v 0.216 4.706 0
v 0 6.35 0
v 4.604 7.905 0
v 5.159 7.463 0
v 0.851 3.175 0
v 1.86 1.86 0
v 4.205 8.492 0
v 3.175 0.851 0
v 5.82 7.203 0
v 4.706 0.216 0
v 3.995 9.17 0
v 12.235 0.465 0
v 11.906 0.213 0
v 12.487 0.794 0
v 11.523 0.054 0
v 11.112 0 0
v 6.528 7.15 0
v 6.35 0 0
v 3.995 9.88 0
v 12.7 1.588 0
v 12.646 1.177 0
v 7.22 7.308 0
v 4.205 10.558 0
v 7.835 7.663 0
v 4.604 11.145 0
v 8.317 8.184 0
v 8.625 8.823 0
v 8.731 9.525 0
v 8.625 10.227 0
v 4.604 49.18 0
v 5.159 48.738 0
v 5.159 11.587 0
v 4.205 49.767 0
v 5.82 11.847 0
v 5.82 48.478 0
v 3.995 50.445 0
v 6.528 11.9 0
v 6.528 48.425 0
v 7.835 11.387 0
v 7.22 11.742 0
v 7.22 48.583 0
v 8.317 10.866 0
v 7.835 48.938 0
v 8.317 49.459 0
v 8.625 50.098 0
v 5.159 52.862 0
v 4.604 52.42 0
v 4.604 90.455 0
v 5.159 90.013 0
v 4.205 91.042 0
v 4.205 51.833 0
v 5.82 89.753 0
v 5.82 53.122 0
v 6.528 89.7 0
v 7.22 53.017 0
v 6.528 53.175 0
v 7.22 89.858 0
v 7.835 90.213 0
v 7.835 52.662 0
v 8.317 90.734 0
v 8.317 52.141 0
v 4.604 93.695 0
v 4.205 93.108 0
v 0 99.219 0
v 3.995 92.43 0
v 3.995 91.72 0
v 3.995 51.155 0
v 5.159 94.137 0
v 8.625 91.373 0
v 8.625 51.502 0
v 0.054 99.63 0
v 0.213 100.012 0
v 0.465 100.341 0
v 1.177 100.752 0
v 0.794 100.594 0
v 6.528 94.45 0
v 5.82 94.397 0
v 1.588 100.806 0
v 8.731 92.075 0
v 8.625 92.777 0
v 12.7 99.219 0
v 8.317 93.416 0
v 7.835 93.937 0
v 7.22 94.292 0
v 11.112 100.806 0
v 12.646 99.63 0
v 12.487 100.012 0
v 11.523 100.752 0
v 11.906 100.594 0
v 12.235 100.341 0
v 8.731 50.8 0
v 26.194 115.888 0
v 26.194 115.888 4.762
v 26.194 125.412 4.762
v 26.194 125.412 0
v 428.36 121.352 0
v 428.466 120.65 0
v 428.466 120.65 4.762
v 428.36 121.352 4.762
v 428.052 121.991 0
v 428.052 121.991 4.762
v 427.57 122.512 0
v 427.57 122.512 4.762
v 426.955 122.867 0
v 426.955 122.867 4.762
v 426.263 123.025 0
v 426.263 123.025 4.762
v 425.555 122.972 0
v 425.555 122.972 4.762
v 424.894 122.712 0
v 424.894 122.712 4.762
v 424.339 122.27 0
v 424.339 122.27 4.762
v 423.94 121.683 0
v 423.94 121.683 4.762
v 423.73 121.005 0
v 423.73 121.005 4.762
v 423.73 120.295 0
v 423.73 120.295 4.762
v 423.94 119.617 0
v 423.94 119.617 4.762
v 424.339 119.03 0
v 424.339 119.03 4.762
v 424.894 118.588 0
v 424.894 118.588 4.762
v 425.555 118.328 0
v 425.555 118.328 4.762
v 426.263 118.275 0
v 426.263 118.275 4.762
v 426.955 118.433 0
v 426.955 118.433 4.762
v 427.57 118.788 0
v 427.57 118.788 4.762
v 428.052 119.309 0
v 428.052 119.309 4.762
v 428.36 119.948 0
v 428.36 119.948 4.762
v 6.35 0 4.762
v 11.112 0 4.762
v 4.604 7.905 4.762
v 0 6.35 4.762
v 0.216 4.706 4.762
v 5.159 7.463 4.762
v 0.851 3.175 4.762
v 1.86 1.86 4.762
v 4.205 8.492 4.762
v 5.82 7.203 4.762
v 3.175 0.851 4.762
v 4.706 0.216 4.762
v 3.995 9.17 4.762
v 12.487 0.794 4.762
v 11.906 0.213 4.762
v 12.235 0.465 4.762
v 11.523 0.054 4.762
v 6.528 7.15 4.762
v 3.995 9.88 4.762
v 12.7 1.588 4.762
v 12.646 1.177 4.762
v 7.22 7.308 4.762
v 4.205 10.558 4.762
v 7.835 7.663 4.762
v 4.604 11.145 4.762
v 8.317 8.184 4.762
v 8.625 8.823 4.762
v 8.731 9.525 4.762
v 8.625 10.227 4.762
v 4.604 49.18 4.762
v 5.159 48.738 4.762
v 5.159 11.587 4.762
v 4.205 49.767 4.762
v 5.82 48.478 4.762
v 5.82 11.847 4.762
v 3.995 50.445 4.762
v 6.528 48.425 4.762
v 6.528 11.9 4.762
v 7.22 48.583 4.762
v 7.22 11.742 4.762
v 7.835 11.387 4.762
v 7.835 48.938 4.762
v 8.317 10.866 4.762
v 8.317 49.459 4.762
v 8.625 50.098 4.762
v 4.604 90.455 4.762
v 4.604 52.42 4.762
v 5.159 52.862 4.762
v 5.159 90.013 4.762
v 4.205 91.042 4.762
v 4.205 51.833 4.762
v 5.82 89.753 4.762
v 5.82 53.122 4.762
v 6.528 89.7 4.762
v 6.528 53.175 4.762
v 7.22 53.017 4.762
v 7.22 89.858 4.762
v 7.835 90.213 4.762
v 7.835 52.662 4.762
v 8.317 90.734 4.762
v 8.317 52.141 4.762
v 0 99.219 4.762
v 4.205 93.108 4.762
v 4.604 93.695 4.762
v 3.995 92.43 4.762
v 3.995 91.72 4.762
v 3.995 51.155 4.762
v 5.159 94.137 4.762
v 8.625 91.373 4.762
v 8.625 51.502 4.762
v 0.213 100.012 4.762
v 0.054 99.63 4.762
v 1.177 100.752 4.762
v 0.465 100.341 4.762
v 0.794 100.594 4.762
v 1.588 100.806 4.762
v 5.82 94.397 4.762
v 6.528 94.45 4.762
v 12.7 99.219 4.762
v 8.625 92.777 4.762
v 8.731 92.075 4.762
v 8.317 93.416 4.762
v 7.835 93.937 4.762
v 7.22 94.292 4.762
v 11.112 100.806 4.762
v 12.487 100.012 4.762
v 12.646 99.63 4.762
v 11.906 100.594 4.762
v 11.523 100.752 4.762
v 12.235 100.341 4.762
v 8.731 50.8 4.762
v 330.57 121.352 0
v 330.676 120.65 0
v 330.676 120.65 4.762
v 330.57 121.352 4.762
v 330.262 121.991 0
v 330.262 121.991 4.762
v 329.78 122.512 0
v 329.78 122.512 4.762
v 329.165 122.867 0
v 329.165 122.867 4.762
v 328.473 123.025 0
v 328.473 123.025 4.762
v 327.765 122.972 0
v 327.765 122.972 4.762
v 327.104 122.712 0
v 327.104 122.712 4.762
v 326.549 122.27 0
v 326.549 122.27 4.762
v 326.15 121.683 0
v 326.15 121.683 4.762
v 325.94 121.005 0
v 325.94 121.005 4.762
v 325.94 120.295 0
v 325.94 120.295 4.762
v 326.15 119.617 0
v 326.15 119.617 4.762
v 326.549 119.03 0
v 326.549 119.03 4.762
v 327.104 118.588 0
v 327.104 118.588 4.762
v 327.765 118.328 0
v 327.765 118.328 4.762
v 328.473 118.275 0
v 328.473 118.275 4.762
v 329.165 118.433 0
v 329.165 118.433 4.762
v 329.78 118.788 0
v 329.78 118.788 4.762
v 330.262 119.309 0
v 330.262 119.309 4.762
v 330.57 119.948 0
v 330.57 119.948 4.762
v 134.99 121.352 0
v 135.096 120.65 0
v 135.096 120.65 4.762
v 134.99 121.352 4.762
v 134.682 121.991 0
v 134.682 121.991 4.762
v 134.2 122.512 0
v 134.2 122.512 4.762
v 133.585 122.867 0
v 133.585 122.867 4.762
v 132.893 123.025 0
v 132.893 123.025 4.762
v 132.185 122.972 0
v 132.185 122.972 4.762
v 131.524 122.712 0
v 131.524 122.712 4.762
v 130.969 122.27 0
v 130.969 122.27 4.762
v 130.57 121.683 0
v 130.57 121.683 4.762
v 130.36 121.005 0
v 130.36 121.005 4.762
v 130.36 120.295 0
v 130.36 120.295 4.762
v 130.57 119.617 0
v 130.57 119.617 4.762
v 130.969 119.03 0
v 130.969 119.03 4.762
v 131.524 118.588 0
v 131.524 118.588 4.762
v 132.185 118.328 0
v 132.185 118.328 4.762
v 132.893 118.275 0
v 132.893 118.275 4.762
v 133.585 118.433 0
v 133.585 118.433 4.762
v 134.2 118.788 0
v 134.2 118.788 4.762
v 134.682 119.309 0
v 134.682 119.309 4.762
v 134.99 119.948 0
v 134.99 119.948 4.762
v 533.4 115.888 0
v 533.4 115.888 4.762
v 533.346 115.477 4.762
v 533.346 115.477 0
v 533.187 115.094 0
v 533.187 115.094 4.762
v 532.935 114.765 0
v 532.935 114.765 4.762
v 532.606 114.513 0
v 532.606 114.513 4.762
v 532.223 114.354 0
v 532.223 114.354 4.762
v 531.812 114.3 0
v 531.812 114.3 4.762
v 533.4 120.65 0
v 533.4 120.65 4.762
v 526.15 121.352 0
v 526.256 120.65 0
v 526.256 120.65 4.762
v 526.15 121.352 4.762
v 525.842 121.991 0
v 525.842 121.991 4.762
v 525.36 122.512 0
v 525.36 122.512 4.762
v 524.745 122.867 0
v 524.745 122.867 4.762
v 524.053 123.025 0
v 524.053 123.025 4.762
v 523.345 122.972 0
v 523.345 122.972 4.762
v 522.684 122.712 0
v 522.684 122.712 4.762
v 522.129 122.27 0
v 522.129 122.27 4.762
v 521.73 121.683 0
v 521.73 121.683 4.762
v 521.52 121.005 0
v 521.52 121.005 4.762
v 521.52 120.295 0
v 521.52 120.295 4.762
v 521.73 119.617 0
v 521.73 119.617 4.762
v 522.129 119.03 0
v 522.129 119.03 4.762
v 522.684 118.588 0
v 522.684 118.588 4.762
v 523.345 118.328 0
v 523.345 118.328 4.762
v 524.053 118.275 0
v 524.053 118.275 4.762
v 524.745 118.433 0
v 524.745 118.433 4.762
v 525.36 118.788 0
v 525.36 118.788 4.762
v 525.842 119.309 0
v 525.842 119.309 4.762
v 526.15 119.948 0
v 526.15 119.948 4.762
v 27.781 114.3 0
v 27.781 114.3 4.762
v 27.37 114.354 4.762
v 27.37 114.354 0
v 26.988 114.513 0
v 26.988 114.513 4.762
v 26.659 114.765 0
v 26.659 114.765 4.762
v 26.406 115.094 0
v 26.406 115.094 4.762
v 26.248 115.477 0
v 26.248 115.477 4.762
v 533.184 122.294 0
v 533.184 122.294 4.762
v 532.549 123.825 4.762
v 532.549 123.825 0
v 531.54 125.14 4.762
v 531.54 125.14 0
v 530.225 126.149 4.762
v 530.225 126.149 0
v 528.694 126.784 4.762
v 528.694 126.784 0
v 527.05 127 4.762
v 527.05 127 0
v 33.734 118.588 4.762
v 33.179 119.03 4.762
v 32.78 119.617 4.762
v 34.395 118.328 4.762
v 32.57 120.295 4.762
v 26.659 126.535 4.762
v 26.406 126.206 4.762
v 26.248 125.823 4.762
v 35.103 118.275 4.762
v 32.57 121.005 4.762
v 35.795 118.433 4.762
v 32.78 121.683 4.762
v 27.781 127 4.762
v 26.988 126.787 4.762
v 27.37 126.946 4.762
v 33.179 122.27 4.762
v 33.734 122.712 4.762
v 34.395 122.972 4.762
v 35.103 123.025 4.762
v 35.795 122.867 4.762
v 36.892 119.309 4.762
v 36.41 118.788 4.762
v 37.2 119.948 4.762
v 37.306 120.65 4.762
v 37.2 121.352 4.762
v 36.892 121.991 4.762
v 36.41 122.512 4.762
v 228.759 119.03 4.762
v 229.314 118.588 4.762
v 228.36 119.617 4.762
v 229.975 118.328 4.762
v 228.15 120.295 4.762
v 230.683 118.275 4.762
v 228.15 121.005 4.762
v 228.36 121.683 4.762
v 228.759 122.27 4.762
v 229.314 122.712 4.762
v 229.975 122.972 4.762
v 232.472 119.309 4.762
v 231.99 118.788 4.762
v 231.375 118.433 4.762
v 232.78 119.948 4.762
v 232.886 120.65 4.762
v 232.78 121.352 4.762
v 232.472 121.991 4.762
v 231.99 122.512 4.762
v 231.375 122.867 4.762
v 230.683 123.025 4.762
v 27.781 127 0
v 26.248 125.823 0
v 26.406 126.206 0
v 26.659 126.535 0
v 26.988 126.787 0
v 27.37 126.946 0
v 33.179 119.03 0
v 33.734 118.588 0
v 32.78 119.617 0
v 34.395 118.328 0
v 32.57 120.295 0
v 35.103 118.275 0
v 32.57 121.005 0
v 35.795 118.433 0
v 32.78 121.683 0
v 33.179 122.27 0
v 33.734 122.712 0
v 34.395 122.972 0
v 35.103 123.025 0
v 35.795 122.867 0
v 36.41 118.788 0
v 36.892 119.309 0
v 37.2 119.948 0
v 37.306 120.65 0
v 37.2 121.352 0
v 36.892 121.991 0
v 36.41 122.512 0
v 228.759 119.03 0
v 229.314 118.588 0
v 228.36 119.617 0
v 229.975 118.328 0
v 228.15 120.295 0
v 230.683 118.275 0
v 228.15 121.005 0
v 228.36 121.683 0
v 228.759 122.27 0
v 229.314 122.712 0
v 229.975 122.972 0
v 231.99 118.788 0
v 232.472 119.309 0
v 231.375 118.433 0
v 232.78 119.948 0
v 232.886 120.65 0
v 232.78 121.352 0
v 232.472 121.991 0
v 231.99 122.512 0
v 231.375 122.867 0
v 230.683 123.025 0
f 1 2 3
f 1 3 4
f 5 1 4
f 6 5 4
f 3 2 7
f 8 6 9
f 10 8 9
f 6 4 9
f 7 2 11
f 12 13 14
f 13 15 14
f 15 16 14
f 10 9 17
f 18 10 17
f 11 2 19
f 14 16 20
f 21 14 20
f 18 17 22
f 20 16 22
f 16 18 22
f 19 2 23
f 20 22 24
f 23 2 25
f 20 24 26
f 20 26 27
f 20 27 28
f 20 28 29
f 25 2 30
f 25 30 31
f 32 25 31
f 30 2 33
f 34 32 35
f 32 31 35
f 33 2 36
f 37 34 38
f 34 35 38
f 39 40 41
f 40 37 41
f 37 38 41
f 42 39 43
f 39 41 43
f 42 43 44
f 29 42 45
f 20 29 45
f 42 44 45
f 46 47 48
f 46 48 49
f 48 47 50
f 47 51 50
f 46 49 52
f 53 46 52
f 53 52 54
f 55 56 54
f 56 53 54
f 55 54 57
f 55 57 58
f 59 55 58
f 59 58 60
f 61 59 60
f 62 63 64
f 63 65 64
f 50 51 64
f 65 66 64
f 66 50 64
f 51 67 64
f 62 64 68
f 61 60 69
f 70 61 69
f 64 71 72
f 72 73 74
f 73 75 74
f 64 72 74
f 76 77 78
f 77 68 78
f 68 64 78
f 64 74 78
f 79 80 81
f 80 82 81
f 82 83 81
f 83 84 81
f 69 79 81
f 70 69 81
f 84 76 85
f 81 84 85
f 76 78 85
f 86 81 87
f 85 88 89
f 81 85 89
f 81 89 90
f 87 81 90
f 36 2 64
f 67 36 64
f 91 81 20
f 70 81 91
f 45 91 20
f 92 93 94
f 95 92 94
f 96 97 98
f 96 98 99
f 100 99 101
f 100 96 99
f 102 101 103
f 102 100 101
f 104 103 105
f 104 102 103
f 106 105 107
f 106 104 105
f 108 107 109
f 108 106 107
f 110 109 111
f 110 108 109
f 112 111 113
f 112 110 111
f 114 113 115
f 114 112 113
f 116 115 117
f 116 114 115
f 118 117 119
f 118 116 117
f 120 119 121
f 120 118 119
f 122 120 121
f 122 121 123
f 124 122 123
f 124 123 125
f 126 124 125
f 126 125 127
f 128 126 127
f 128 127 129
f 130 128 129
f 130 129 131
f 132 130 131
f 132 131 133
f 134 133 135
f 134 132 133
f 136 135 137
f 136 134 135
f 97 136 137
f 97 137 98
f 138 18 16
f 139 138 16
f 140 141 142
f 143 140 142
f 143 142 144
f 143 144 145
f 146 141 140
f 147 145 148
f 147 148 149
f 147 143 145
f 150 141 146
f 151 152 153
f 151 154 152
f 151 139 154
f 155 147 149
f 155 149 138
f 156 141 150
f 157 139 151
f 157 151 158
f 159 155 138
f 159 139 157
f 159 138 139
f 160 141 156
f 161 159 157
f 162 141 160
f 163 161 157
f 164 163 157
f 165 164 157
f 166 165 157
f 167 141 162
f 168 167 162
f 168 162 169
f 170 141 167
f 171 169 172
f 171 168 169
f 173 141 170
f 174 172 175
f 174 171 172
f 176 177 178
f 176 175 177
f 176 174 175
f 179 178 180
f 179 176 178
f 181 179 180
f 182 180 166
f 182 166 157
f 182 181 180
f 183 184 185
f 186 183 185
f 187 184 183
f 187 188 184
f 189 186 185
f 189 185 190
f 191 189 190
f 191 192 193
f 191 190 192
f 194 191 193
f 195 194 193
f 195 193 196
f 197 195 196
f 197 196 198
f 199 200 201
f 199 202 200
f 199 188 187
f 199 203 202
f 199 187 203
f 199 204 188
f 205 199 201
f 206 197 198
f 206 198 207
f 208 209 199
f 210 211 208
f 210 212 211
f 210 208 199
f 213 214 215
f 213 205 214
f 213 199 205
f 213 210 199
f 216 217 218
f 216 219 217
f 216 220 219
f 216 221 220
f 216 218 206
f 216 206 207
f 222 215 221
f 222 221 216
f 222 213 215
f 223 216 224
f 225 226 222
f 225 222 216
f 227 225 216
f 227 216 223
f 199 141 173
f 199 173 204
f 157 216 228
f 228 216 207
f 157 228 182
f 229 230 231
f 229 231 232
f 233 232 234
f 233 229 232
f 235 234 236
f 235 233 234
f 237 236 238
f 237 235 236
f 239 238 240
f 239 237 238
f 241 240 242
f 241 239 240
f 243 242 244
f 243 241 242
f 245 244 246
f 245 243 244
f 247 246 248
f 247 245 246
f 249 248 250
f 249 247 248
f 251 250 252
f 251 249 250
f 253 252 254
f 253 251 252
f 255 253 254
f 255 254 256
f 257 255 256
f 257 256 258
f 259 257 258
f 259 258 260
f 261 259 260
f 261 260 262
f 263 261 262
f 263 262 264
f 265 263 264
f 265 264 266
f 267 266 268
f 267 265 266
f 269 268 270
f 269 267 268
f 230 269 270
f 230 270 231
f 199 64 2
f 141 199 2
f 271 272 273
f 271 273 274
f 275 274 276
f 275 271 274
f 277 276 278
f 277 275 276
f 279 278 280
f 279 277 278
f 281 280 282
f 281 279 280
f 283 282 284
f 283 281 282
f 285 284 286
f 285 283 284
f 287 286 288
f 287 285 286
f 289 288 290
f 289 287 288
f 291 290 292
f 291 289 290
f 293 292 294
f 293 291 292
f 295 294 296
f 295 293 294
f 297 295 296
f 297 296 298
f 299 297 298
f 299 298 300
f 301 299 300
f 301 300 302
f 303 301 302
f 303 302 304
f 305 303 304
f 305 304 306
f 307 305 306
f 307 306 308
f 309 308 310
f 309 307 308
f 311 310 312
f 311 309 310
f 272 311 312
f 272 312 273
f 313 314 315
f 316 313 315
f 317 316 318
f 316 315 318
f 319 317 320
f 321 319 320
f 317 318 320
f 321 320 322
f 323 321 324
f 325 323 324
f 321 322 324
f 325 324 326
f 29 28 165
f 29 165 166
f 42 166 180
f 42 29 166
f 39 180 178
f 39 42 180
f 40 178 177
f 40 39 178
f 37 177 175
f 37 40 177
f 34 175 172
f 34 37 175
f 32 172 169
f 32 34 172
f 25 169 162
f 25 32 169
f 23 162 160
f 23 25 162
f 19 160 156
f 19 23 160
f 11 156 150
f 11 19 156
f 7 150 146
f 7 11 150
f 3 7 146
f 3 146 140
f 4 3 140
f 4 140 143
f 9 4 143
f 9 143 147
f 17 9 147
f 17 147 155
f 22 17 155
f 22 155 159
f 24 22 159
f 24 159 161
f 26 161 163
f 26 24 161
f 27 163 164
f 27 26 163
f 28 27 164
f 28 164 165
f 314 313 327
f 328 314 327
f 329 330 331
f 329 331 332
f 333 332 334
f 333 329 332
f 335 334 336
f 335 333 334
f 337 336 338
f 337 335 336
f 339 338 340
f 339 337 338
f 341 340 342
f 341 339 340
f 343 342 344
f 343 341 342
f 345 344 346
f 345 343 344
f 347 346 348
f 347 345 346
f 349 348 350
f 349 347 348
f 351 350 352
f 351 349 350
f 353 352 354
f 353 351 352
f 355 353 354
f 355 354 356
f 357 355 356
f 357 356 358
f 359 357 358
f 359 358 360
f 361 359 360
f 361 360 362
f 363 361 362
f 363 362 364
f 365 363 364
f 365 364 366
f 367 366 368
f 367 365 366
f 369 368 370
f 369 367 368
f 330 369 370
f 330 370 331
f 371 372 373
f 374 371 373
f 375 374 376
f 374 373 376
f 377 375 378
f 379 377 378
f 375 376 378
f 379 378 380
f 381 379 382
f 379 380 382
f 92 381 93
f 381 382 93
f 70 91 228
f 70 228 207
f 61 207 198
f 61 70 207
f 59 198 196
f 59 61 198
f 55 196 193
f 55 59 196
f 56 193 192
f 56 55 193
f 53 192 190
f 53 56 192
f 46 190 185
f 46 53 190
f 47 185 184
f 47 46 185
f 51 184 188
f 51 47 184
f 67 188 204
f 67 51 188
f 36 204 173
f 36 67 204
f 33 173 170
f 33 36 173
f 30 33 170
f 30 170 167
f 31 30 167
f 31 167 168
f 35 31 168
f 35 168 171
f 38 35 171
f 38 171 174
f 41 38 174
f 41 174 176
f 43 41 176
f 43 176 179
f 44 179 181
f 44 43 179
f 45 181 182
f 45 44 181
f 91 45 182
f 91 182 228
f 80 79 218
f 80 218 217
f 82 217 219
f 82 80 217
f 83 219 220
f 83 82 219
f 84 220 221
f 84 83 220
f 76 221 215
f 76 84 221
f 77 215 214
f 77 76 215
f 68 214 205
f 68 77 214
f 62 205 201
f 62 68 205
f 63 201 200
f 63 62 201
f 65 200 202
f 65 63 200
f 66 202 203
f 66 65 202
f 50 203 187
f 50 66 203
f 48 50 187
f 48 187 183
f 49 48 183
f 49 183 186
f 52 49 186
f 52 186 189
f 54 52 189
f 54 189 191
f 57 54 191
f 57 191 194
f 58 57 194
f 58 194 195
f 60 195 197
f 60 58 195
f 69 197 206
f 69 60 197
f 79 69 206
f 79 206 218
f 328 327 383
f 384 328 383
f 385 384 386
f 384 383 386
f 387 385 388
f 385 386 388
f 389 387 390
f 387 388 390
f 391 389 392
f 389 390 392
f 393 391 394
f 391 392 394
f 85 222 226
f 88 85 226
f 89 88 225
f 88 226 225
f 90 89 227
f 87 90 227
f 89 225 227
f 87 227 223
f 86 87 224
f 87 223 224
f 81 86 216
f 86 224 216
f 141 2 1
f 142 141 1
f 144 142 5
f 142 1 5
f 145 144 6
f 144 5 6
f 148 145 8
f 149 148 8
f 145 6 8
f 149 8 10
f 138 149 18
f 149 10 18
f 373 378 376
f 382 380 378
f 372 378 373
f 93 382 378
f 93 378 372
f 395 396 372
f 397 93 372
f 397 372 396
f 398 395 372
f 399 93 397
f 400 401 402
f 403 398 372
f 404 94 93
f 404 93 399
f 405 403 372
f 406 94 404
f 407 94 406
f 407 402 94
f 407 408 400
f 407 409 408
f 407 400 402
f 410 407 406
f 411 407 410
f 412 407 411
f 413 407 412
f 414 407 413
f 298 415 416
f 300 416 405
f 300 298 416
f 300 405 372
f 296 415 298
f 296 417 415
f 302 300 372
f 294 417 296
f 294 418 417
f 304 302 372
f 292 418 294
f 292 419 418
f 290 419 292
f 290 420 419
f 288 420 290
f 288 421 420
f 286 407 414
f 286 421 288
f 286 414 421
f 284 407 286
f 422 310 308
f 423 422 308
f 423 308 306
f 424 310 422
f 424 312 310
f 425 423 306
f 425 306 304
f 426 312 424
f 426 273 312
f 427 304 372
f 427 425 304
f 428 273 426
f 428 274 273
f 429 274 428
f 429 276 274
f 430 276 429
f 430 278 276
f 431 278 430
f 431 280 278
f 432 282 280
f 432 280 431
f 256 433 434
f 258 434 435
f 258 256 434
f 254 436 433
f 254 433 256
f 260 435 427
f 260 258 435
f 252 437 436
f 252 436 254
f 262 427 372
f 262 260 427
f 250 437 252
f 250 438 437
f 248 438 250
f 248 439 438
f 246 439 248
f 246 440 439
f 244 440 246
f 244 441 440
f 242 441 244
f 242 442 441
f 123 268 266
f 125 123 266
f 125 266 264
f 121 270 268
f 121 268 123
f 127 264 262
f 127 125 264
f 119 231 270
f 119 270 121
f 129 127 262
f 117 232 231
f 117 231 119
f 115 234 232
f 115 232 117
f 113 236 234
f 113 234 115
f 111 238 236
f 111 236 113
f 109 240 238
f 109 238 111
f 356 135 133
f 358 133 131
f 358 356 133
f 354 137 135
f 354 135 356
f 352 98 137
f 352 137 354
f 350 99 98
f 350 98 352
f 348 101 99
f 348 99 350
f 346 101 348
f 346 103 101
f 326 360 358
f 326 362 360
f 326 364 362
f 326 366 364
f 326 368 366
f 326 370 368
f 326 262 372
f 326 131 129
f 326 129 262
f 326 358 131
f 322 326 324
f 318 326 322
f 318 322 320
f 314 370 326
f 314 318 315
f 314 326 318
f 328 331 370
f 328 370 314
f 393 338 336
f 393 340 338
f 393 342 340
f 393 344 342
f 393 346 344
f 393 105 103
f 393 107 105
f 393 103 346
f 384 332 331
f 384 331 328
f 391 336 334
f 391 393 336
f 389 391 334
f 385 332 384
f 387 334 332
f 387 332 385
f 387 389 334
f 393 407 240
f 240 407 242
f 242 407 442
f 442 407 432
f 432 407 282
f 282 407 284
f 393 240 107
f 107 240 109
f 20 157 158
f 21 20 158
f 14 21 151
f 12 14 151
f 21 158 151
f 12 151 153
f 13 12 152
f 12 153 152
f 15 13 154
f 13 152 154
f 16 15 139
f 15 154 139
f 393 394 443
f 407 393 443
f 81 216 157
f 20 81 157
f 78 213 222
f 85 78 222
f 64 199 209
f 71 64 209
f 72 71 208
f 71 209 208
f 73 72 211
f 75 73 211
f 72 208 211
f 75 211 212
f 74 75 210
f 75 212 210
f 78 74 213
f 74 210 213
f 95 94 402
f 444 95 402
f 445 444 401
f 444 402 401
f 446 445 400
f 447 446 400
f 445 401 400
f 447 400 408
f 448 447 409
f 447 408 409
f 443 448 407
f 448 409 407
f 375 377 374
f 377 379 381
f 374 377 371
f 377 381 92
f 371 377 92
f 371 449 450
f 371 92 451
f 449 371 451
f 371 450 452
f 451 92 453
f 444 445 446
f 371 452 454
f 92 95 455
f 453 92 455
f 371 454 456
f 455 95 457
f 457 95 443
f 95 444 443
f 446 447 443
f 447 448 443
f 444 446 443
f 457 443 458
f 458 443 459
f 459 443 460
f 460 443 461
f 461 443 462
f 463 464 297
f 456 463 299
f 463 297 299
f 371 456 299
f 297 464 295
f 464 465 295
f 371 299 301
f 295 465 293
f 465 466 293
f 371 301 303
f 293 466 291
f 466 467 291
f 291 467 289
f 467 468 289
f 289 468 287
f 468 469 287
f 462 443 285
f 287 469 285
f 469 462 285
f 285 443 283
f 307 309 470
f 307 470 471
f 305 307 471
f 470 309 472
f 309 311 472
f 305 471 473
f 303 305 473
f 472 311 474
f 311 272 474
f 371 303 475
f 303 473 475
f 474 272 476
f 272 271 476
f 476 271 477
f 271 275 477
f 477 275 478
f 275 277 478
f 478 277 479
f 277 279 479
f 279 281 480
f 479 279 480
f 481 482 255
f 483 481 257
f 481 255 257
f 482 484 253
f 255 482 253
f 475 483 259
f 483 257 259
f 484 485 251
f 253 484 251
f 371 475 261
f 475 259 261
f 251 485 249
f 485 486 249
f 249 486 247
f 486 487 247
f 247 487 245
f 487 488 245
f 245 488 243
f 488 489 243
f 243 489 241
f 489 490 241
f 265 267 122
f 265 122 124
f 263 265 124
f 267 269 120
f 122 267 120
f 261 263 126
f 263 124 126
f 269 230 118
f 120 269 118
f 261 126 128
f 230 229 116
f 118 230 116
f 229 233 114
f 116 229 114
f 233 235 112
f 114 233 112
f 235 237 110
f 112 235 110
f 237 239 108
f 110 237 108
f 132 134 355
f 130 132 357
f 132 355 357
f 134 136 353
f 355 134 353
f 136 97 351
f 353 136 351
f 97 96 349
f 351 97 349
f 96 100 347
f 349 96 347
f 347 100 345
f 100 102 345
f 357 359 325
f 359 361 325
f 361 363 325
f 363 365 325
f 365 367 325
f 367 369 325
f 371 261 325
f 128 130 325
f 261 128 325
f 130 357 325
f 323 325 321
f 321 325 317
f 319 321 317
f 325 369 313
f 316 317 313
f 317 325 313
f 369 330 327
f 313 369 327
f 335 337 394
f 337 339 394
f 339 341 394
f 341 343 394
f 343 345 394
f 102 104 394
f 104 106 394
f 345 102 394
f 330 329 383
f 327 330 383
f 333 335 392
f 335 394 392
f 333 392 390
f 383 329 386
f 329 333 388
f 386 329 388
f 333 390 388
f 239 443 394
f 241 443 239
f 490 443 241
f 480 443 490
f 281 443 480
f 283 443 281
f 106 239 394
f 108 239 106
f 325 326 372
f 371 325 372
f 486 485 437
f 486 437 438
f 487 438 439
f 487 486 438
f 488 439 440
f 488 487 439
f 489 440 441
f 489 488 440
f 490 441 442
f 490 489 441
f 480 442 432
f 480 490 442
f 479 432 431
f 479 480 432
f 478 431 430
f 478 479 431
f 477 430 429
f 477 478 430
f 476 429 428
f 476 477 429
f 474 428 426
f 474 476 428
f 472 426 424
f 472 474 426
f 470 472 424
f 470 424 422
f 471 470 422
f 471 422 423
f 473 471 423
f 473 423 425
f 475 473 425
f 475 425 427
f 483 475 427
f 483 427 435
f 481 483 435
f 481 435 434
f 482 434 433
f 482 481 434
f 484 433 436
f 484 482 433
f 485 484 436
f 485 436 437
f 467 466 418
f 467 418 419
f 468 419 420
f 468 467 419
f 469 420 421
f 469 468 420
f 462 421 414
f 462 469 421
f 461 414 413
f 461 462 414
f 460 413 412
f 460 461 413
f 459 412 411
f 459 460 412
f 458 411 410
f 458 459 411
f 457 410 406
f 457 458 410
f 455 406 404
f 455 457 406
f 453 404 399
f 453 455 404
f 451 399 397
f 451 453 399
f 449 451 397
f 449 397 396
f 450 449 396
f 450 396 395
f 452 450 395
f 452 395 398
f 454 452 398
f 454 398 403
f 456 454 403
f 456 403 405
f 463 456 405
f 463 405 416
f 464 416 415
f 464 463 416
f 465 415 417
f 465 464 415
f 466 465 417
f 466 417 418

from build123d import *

# Parameters (mm, degrees)
F0_R     = 2.38125
F1_DEPTH = 4.7625
F4_W     = 13.49375
F4_H     = 13.49375
F4_W_2   = 139.7
F4_H_2   = 38.1
F5_DEPTH = 4.7635
F7_DEPTH = 4.7625


# Not quite as in the source:
# - a feature of the source that left no trace in its solid (it failed there, or was rolled back) is left out


with BuildPart() as f1:
    # F0 (on Top) → F1 (new body)
    with BuildSketch(Plane.XY):
        with BuildLine():
            ThreePointArc((0, 6.35), (1.8598719395, 1.8598719395), (6.35, 0))
            Line((6.35, 0), (527.05, 0))
            ThreePointArc((527.05, 0), (531.5401280605, 1.8598719395), (533.4, 6.35))
            Line((533.4, 6.35), (533.4, 120.65))
            ThreePointArc((533.4, 120.65), (531.5401280605, 125.1401280605), (527.05, 127))
            Line((527.05, 127), (400.05, 127))
            ThreePointArc((400.05, 127), (395.5598719395, 128.8598719395), (393.7, 133.35))
            Line((393.7, 133.35), (393.7, 152.4))
            ThreePointArc((393.7, 152.4), (391.8401280605, 156.8901280605), (387.35, 158.75))
            Line((387.35, 158.75), (273.05, 158.75))
            ThreePointArc((273.05, 158.75), (268.5598719395, 156.8901280605), (266.7, 152.4))
            Line((266.7, 152.4), (266.7, 133.35))
            ThreePointArc((266.7, 133.35), (264.8401280605, 128.8598719395), (260.35, 127))
            Line((260.35, 127), (6.35, 127))
            ThreePointArc((6.35, 127), (1.8598719395, 125.1401280605), (0, 120.65))
            Line((0, 120.65), (0, 6.35))
        make_face()
        with Locations((6.35, 9.525)):
            Circle(F0_R, mode=Mode.SUBTRACT)
        with Locations((228.6, 31.75)):
            Circle(F0_R, mode=Mode.SUBTRACT)
        with Locations((6.35, 50.8)):
            Circle(F0_R, mode=Mode.SUBTRACT)
        with Locations((457.2, 31.75)):
            Circle(F0_R, mode=Mode.SUBTRACT)
        with Locations((6.35, 92.075)):
            Circle(F0_R, mode=Mode.SUBTRACT)
        with Locations((228.6, 95.25)):
            Circle(F0_R, mode=Mode.SUBTRACT)
        with Locations((34.925, 120.65)):
            Circle(F0_R, mode=Mode.SUBTRACT)
        with Locations((132.715, 120.65)):
            Circle(F0_R, mode=Mode.SUBTRACT)
        with Locations((230.505, 120.65)):
            Circle(F0_R, mode=Mode.SUBTRACT)
        with BuildLine():
            ThreePointArc((254, 107.95), (255.8598719395, 112.4401280605), (260.35, 114.3))
            Line((260.35, 114.3), (400.05, 114.3))
            ThreePointArc((400.05, 114.3), (404.5401280605, 112.4401280605), (406.4, 107.95))
            Line((406.4, 107.95), (406.4, 69.85))
            ThreePointArc((406.4, 69.85), (404.5401280605, 65.3598719395), (400.05, 63.5))
            Line((400.05, 63.5), (260.35, 63.5))
            ThreePointArc((260.35, 63.5), (255.8598719395, 65.3598719395), (254, 69.85))
            Line((254, 69.85), (254, 107.95))
        make_face(mode=Mode.SUBTRACT)
        with Locations((457.2, 95.25)):
            Circle(F0_R, mode=Mode.SUBTRACT)
        with Locations((328.295, 120.65)):
            Circle(F0_R, mode=Mode.SUBTRACT)
        with Locations((307.975, 147.6375)):
            Circle(F0_R, mode=Mode.SUBTRACT)
        with Locations((352.425, 147.6375)):
            Circle(F0_R, mode=Mode.SUBTRACT)
        with Locations((426.085, 120.65)):
            Circle(F0_R, mode=Mode.SUBTRACT)
        with Locations((523.875, 120.65)):
            Circle(F0_R, mode=Mode.SUBTRACT)
    extrude(amount=F1_DEPTH)

    # F4 (on face) → F5 (cut, through all)
    with BuildSketch(Plane.XY.offset(4.7625)):
        Polygon((26.19375, 127), (0, 127), (0, 100.80625), (12.7, 100.80625), (12.7, 114.3), (26.19375, 114.3), align=None)
        Polygon((533.4, 114.3), (26.19375, 114.3), (26.19375, 100.80625), (12.7, 100.80625), (12.7, 0), (533.4, 0), align=None)
        with Locations((19.446875, 107.553125)):
            Rectangle(F4_W, F4_H)
        with Locations((330.2, 146.05)):
            Rectangle(F4_W_2, F4_H_2)
    extrude(amount=-F5_DEPTH, mode=Mode.SUBTRACT)

    # F6 (on face) → F7 (cut, through all)
    with BuildSketch(Plane.XY.offset(4.7625)):
        with BuildLine():
            Line((12.7, 99.21875), (12.7, 100.80625))
            Line((12.7, 100.80625), (11.1125, 100.80625))
            ThreePointArc((11.1125, 100.80625), (12.2350320151, 100.3412820151), (12.7, 99.21875))
        make_face()
        with BuildLine():
            Line((1.5875, 100.80625), (0, 100.80625))
            Line((0, 100.80625), (0, 99.21875))
            ThreePointArc((0, 99.21875), (0.4649679849, 100.3412820151), (1.5875, 100.80625))
        make_face()
        with BuildLine():
            ThreePointArc((12.7, 1.5875), (12.2350320151, 0.4649679849), (11.1125, 0))
            Line((11.1125, 0), (12.7, 0))
            Line((12.7, 0), (12.7, 1.5875))
        make_face()
        with BuildLine():
            ThreePointArc((26.19375, 125.4125), (26.6587179849, 126.5350320151), (27.78125, 127))
            Line((27.78125, 127), (26.19375, 127))
            Line((26.19375, 127), (26.19375, 125.4125))
        make_face()
        with BuildLine():
            Line((26.19375, 115.8875), (26.19375, 114.3))
            Line((26.19375, 114.3), (27.78125, 114.3))
            ThreePointArc((27.78125, 114.3), (26.6587179849, 114.7649679849), (26.19375, 115.8875))
        make_face()
        with BuildLine():
            Line((531.8125, 114.3), (533.4, 114.3))
            Line((533.4, 114.3), (533.4, 115.8875))
            ThreePointArc((533.4, 115.8875), (532.9350320151, 114.7649679849), (531.8125, 114.3))
        make_face()
    extrude(amount=-F7_DEPTH, mode=Mode.SUBTRACT)


solid = f1.part
